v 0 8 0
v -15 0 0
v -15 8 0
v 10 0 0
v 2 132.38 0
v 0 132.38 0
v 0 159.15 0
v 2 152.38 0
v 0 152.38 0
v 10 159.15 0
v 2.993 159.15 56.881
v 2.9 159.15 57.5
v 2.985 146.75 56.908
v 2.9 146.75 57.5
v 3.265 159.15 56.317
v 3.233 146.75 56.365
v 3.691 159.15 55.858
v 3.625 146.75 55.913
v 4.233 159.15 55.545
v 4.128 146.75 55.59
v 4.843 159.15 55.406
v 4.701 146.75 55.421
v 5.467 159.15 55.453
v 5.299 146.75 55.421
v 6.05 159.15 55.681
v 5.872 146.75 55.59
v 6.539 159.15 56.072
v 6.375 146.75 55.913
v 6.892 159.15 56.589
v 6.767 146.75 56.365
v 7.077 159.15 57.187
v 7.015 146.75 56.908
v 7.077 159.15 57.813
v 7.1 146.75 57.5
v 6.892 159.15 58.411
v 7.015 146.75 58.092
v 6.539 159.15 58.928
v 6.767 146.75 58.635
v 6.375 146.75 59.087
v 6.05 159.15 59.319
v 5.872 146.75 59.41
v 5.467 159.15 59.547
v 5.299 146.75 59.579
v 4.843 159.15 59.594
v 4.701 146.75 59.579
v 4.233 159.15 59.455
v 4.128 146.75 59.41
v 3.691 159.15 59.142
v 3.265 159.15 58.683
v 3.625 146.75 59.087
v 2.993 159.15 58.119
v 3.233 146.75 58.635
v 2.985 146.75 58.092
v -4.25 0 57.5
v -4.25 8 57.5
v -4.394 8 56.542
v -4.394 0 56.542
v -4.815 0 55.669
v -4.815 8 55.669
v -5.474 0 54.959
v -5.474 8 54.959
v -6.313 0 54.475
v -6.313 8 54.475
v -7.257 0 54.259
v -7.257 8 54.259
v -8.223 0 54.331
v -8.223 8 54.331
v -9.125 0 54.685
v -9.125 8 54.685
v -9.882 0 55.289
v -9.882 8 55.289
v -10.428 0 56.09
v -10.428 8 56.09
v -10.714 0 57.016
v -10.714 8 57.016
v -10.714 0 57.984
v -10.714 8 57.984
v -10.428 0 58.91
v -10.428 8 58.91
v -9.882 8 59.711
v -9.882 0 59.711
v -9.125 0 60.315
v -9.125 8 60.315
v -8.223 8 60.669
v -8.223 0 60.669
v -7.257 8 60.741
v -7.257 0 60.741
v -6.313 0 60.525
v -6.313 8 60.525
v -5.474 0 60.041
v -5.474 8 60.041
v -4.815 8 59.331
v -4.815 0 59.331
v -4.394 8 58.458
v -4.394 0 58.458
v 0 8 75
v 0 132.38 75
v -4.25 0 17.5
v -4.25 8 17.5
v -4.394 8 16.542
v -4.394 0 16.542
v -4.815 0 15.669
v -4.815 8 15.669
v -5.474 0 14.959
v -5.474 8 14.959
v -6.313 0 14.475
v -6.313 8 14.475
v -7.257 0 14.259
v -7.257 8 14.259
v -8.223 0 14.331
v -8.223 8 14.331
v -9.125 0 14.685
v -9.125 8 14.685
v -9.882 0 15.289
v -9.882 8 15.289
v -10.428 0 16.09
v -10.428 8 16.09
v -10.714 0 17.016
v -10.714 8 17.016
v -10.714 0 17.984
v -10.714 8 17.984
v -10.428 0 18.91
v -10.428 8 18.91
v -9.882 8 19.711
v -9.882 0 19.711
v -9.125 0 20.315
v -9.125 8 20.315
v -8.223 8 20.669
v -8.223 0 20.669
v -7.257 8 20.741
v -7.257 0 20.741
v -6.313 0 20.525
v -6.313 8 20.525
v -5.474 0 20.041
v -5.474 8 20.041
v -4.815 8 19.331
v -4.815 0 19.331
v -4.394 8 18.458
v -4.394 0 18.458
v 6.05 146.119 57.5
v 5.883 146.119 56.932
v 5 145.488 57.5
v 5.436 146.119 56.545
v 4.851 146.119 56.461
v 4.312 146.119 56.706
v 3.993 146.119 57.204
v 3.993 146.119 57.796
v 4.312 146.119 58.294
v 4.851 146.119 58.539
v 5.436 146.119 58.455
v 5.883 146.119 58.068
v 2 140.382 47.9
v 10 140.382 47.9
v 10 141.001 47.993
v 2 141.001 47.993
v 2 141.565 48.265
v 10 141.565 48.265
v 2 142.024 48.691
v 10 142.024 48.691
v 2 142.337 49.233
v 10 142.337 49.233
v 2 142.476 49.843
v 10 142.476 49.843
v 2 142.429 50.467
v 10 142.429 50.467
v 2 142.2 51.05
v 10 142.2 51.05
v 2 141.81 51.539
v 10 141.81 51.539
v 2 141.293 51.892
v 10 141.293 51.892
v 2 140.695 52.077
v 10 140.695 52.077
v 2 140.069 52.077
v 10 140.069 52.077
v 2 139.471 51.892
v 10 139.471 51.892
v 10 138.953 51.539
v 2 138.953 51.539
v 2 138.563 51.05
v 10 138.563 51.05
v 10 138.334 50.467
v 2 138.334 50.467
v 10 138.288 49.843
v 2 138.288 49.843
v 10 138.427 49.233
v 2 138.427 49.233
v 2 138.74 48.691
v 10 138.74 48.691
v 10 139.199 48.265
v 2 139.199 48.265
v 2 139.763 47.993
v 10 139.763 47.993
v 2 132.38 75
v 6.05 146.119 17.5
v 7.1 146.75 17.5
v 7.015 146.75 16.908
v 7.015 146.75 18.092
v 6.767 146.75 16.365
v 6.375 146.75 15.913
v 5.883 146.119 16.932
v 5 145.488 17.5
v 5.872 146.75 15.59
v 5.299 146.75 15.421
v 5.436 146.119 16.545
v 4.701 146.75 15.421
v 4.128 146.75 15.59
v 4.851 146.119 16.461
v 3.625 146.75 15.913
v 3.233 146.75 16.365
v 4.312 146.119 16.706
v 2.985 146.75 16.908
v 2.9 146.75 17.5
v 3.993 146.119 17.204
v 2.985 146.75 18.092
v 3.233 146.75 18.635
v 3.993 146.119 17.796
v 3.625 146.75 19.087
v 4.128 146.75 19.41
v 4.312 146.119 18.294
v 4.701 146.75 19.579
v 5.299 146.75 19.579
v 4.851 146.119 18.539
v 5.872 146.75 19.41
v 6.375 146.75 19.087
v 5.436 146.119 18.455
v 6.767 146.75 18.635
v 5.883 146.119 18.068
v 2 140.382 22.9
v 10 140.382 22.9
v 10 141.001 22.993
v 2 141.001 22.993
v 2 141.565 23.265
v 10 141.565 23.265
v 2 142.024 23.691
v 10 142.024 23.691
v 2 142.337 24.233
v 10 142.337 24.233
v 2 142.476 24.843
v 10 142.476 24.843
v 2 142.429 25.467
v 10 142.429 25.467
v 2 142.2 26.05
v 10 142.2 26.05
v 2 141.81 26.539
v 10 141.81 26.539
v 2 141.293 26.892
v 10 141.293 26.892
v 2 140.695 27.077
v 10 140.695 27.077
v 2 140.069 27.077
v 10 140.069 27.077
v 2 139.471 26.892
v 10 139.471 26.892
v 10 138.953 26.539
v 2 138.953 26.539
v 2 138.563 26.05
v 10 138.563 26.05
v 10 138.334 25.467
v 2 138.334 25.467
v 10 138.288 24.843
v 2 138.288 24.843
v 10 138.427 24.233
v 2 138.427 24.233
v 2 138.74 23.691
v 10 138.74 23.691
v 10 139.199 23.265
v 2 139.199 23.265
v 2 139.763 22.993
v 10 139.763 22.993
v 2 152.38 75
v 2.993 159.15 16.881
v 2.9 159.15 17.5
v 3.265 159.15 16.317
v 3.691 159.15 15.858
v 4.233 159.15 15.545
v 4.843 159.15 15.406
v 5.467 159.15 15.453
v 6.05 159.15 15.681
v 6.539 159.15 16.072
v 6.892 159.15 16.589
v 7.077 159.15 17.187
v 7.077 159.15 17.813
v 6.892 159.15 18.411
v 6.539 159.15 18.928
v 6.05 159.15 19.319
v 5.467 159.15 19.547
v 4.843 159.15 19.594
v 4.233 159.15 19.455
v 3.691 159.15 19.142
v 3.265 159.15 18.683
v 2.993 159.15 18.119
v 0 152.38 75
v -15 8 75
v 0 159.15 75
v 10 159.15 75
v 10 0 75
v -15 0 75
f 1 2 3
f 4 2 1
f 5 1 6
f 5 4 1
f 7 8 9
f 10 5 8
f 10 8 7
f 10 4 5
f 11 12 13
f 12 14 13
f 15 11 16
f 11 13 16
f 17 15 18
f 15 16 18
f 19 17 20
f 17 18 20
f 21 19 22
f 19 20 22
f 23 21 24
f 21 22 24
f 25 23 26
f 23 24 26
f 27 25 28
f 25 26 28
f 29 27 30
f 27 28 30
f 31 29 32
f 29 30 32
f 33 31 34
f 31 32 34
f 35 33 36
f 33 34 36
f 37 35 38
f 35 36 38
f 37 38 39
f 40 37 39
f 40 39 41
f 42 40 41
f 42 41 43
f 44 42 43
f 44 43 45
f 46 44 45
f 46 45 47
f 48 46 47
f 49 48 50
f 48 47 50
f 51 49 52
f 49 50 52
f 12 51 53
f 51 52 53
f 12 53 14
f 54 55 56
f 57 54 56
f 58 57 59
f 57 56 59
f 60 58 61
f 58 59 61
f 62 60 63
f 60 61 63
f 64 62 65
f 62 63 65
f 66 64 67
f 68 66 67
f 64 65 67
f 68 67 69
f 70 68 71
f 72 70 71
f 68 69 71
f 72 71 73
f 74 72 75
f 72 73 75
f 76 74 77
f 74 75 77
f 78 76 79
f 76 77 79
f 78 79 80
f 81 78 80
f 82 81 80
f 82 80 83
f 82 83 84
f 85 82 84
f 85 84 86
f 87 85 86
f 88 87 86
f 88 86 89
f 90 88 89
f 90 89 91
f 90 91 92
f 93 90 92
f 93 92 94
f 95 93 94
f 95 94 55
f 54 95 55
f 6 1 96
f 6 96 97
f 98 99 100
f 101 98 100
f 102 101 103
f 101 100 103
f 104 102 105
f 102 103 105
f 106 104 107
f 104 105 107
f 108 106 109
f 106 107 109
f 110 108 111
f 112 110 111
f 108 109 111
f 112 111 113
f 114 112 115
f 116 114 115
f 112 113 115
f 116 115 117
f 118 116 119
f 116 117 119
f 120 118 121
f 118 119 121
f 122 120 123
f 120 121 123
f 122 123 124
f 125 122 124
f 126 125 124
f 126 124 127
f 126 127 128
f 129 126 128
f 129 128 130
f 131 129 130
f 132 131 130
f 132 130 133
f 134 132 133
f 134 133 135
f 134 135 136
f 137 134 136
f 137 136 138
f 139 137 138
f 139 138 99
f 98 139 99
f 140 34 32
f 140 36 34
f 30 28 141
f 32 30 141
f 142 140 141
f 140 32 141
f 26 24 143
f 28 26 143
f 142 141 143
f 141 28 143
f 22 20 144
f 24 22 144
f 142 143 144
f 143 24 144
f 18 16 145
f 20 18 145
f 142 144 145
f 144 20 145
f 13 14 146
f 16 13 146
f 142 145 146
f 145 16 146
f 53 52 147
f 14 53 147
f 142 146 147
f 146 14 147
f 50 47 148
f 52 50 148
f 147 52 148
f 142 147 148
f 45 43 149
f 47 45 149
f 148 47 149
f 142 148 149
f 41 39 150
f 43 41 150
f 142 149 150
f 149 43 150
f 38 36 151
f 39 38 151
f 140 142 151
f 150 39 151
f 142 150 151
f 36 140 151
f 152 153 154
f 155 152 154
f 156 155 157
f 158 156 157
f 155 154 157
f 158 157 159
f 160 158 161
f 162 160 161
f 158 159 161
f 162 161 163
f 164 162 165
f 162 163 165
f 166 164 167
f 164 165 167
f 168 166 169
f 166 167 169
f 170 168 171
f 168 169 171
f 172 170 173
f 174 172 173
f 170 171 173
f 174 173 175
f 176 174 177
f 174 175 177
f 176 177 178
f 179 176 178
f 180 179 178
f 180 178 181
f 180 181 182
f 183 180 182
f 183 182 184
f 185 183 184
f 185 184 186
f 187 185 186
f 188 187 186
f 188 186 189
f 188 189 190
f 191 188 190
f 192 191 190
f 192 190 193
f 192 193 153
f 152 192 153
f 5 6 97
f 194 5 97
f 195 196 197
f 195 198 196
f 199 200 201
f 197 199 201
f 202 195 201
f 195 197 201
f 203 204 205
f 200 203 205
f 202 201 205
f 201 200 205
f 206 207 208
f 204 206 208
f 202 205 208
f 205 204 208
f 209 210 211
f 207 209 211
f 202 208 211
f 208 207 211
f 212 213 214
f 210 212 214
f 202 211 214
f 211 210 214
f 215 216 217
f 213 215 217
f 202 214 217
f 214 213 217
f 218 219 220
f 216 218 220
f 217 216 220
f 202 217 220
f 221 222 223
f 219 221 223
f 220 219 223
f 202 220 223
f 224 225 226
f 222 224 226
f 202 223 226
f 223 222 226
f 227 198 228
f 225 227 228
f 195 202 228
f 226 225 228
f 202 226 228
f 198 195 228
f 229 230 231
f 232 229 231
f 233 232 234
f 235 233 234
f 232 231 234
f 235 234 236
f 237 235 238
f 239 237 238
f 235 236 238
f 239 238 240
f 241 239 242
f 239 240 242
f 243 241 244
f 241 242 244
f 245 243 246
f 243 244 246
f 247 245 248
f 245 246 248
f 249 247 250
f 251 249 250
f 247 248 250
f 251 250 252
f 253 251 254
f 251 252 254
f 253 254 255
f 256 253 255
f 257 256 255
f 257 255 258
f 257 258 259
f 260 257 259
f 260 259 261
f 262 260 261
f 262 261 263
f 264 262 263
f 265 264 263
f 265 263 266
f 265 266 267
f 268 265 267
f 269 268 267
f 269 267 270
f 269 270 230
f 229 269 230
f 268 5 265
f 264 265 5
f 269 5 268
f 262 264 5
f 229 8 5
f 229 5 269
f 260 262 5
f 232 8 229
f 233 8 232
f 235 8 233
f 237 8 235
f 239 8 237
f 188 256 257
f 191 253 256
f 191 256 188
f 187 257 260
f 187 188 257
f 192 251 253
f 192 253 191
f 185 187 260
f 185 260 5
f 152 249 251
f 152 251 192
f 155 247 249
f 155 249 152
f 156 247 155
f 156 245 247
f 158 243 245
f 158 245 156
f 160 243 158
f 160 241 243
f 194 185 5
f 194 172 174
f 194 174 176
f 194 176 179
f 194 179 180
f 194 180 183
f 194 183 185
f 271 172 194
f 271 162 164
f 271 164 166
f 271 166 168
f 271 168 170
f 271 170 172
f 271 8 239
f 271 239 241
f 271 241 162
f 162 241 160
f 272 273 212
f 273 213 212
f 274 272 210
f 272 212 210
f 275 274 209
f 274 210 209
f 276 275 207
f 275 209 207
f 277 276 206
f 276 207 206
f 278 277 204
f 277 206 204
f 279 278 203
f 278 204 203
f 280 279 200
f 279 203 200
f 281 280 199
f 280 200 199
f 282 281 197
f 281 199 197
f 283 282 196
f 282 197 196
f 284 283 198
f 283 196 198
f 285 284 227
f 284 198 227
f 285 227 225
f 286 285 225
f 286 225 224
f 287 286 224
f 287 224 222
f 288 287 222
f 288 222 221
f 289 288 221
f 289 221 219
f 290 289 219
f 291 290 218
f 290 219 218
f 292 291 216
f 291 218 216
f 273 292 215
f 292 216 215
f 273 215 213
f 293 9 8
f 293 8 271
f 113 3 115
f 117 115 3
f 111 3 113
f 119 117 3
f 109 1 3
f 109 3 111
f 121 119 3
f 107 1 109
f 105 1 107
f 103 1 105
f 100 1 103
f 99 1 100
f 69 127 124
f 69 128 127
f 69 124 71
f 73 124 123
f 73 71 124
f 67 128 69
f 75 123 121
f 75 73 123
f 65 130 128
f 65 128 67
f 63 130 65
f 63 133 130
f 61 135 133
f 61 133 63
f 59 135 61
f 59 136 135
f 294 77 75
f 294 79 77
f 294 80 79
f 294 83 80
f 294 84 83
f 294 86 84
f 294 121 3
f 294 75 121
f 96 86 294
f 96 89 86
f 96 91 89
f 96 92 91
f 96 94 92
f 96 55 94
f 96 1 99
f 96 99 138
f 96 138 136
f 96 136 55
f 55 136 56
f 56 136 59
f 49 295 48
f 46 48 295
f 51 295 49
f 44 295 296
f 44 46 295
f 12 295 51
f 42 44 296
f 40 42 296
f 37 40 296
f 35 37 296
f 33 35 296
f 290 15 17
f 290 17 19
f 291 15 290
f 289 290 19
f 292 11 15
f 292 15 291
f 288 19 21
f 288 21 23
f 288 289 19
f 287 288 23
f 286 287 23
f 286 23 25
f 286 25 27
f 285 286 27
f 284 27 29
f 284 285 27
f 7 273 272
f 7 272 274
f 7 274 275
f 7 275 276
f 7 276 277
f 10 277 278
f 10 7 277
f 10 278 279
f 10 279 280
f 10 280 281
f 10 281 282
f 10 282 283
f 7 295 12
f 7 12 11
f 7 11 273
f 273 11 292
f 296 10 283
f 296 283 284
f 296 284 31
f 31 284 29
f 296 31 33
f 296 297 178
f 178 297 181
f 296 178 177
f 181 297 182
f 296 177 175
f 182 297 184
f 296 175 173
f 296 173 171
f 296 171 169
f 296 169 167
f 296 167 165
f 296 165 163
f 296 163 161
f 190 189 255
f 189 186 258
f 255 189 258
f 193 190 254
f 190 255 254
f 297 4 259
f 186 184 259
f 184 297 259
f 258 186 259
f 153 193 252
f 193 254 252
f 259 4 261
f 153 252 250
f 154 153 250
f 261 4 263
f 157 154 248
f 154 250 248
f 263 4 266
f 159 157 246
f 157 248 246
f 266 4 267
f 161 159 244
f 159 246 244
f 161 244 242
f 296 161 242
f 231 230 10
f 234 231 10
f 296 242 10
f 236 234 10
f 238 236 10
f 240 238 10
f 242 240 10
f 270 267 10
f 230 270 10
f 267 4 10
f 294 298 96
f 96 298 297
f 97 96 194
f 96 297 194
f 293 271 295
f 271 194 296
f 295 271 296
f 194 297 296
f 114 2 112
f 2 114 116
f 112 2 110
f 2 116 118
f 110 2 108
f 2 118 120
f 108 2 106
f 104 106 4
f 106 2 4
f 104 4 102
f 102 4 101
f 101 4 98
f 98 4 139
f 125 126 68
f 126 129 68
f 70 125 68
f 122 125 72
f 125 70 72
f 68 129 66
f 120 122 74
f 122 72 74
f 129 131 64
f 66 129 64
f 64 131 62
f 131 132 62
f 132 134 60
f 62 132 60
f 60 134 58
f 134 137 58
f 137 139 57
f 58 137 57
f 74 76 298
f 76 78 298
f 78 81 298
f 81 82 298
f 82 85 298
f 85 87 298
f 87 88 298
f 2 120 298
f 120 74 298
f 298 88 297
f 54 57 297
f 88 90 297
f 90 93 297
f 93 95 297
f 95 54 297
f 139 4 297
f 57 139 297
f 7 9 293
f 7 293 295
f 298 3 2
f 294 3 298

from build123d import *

# Parameters (mm, degrees)
SKETCH_1_W             = 10
SKETCH_1_H             = 159.15
EXTRUDE_1_DEPTH        = 75
HOLE_WIZARD_M5_1_D     = 4.2
HOLE_WIZARD_M5_1_DEPTH = 12.4
HOLE_WIZARD_M5_1_TIP   = 1.2618073
SKETCH_4_W             = 75
SKETCH_4_H             = 20
CUT_EXTRUDE_1_DEPTH    = 2
HOLE_WIZARD_M5_2_D     = 4.2
HOLE_WIZARD_M5_2_DEPTH = 12.4
HOLE_WIZARD_M5_2_TIP   = 1.2618073
SKETCH_7_W             = 75
SKETCH_7_H             = 8
EXTRUDE_2_DEPTH        = 15
SKETCH_8_R             = 3.25
CUT_EXTRUDE_2_DEPTH    = 9


with BuildPart() as part:
    # 草图1 → 凸台-拉伸1 (new body)
    with BuildSketch(Plane.XY):
        with Locations((5, 79.575)):
            Rectangle(SKETCH_1_W, SKETCH_1_H)
    extrude(amount=EXTRUDE_1_DEPTH)

    # M5 螺纹孔1
    with Locations(Plane(origin=(0, 159.15, 0), x_dir=(1, 0, 0), z_dir=(0, 1, 0))):
        with Locations((5, -57.5), (5, -17.5)):
            Hole(HOLE_WIZARD_M5_1_D / 2, depth=HOLE_WIZARD_M5_1_DEPTH)
            with Locations((0, 0, -(HOLE_WIZARD_M5_1_DEPTH + HOLE_WIZARD_M5_1_TIP / 2))):  # 118° drill point
                Cone(0, HOLE_WIZARD_M5_1_D / 2, HOLE_WIZARD_M5_1_TIP, mode=Mode.SUBTRACT)

    # 草图4 → 切除-拉伸1 (cut)
    with BuildSketch(Plane.ZY):
        with Locations((37.5, 142.38)):
            Rectangle(SKETCH_4_W, SKETCH_4_H)
    extrude(amount=-CUT_EXTRUDE_1_DEPTH, mode=Mode.SUBTRACT)

    # M5 螺纹孔2
    with Locations(Plane.ZY.offset(-2)):
        with Locations((25, 140.3817), (50, 140.3817)):
            Hole(HOLE_WIZARD_M5_2_D / 2, depth=HOLE_WIZARD_M5_2_DEPTH)
            with Locations((0, 0, -(HOLE_WIZARD_M5_2_DEPTH + HOLE_WIZARD_M5_2_TIP / 2))):  # 118° drill point
                Cone(0, HOLE_WIZARD_M5_2_D / 2, HOLE_WIZARD_M5_2_TIP, mode=Mode.SUBTRACT)

    # 草图7 → 凸台-拉伸2 (add)
    with BuildSketch(Plane.ZY):
        with Locations((37.5, 4)):
            Rectangle(SKETCH_7_W, SKETCH_7_H)
    extrude(amount=EXTRUDE_2_DEPTH)

    # 草图8 → 切除-拉伸2 (cut, through all)
    with BuildSketch(Plane(origin=(0, 8, 0), x_dir=(1, 0, 0), z_dir=(0, 1, 0))):
        with Locations((-7.5, -17.5)):
            Circle(SKETCH_8_R)
        with Locations((-7.5, -57.5)):
            Circle(SKETCH_8_R)
    extrude(amount=-CUT_EXTRUDE_2_DEPTH, mode=Mode.SUBTRACT)


solid = part.part
